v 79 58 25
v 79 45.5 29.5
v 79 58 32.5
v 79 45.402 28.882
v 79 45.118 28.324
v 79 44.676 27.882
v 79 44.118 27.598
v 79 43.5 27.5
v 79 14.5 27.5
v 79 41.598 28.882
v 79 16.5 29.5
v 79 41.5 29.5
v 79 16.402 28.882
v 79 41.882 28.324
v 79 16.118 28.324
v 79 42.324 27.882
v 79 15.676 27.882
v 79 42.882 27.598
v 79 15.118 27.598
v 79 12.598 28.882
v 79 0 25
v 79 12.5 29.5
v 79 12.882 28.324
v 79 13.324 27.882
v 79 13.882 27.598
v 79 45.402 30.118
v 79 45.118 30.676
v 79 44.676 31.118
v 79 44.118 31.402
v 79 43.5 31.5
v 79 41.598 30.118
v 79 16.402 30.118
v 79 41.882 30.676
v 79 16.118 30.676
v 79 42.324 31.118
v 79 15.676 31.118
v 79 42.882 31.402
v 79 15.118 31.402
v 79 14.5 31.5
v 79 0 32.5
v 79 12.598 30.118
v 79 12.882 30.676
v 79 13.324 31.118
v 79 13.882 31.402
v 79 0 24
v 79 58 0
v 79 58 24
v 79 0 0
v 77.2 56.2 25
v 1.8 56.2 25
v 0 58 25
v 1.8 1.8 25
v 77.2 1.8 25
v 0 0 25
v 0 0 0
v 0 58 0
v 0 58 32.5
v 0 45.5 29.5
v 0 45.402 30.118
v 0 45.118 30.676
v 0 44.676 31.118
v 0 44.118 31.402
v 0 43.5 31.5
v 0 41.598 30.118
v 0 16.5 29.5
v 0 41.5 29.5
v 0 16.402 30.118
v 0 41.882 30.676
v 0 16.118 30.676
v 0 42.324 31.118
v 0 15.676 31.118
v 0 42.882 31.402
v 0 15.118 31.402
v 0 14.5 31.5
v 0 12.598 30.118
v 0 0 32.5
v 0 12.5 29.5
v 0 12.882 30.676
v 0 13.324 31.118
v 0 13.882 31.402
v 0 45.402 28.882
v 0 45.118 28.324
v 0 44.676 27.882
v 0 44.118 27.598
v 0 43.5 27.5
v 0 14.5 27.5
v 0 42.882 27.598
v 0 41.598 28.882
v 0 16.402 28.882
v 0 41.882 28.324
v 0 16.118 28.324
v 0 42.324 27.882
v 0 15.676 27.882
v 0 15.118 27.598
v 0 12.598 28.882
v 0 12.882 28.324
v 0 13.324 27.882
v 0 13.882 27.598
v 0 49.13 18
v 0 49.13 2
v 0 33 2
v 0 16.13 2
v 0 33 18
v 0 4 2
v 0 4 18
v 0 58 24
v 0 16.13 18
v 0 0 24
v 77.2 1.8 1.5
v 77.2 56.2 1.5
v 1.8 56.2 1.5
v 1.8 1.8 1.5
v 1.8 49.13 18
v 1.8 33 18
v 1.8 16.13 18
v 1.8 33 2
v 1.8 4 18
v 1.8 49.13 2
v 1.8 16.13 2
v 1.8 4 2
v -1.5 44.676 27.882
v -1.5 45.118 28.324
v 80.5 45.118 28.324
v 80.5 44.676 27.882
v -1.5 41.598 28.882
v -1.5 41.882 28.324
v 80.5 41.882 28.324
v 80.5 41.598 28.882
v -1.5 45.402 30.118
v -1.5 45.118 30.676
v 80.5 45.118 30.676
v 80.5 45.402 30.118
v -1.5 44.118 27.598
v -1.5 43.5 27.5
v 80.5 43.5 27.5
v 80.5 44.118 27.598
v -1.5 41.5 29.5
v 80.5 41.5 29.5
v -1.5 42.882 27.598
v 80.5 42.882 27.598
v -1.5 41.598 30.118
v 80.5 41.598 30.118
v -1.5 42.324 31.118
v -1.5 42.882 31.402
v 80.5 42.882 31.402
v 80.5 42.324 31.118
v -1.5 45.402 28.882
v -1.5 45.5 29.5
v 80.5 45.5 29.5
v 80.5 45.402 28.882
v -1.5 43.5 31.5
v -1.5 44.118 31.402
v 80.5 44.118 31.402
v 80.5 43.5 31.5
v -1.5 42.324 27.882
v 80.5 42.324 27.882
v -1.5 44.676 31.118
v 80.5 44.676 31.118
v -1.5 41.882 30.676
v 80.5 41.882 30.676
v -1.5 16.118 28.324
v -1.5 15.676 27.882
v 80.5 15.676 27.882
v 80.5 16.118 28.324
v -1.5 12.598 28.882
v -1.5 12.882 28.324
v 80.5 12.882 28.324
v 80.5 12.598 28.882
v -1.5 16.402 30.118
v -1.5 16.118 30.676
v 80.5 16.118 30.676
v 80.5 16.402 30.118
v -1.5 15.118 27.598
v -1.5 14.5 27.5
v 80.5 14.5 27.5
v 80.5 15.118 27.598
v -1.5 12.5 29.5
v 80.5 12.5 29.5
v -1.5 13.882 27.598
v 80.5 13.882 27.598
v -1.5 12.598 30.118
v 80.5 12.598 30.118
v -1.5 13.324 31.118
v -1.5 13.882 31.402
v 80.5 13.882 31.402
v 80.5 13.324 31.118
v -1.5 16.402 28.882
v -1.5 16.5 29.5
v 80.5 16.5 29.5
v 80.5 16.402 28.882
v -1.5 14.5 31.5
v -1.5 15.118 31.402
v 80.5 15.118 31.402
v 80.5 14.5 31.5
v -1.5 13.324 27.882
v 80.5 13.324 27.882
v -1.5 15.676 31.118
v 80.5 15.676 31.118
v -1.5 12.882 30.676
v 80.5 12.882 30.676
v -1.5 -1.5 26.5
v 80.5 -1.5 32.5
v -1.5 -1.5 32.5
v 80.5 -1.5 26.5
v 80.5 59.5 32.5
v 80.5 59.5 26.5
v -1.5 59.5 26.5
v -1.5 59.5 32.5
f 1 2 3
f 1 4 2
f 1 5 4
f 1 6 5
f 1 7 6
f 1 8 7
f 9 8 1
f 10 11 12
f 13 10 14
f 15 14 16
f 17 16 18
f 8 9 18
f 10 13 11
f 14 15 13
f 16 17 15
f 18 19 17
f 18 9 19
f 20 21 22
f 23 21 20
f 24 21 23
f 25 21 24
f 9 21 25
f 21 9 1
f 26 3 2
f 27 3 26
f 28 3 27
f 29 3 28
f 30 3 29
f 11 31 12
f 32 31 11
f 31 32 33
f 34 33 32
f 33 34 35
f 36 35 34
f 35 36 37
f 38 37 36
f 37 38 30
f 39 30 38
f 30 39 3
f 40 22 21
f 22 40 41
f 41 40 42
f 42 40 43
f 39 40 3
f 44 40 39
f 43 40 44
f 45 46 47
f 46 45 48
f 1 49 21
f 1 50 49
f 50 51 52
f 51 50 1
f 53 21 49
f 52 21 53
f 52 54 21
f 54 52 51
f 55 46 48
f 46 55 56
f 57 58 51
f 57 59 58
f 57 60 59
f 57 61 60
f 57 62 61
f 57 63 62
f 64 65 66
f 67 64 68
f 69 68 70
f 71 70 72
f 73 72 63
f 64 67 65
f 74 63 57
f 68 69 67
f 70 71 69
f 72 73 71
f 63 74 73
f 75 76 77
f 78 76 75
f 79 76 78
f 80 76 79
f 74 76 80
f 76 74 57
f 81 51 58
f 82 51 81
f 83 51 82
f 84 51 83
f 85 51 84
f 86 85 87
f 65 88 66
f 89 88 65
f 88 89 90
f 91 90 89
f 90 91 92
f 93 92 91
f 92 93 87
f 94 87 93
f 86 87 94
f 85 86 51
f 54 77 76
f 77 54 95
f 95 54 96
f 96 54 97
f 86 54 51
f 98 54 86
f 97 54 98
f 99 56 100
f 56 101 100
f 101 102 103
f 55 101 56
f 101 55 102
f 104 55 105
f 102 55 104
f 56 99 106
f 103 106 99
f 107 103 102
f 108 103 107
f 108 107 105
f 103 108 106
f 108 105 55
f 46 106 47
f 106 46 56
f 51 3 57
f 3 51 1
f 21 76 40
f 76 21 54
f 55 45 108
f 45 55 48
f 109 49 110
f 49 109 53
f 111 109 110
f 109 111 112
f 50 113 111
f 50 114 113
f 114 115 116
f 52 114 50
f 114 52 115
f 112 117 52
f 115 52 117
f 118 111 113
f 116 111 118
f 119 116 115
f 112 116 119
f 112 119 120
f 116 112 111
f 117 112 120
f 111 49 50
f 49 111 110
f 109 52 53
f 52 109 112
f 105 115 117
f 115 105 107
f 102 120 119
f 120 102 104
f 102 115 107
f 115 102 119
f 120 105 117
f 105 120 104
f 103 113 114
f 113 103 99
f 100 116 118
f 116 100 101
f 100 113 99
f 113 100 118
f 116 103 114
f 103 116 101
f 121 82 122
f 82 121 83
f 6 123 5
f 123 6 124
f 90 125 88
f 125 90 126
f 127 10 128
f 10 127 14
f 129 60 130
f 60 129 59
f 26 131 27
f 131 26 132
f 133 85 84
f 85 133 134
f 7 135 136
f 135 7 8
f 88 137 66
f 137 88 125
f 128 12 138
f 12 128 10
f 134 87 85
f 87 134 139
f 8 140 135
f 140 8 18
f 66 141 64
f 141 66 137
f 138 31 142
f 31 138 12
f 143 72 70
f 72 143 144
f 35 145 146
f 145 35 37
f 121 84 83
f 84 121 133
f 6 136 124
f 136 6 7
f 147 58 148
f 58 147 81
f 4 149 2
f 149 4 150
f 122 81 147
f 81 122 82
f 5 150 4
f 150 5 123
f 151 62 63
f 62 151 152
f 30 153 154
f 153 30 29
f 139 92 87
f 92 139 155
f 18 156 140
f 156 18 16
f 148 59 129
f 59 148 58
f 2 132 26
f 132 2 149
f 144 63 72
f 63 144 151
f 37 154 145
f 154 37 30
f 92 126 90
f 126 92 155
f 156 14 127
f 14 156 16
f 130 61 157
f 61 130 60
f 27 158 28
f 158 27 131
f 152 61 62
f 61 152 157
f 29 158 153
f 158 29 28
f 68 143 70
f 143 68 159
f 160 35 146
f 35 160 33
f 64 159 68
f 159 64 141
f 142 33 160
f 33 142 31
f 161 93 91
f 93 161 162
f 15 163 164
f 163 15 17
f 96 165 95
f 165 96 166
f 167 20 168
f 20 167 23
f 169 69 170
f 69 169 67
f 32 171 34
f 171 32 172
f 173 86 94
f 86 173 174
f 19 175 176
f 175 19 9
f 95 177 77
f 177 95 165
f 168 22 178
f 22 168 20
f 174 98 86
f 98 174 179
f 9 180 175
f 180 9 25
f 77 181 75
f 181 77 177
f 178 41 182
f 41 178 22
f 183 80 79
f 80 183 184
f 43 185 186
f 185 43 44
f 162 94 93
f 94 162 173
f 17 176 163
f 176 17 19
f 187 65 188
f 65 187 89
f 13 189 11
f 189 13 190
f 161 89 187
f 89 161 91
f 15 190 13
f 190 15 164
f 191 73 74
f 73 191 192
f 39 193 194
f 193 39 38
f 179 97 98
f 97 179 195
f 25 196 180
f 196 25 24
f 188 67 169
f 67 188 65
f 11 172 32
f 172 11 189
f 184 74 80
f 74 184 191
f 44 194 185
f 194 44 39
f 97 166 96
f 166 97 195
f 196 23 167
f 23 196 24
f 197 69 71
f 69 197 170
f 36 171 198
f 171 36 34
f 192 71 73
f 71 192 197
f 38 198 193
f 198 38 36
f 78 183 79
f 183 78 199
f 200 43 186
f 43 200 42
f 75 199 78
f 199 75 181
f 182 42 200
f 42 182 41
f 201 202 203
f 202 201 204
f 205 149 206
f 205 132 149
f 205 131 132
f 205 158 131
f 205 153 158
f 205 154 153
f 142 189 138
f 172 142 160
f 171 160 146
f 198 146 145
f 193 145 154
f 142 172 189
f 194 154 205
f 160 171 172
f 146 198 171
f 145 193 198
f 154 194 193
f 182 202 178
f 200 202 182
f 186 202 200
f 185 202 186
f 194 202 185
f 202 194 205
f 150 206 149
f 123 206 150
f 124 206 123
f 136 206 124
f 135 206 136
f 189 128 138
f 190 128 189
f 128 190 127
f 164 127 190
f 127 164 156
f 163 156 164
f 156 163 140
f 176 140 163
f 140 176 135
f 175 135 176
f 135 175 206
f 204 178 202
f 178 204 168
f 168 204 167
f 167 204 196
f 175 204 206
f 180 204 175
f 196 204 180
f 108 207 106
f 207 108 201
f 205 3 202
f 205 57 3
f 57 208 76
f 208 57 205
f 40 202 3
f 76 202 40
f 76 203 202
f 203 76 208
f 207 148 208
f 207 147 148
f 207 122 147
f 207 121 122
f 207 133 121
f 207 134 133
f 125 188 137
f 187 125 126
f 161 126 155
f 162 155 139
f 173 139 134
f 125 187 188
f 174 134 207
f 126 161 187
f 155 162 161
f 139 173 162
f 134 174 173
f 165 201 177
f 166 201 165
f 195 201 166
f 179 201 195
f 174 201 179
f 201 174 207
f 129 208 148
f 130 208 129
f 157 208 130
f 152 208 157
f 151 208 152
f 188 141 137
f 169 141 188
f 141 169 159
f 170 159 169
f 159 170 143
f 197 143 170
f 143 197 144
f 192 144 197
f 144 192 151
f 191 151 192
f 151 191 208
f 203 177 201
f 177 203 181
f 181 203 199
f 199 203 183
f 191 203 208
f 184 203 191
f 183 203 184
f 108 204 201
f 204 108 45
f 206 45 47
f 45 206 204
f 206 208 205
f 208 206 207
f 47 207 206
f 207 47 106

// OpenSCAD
module mimic_board() {
    cube([74.04, 53, 5]);
    translate([-1, 3, 2]) {
        cube([14.5, 9.13, 12]);
    }
    translate([14.5, 1, 5]) {
        cube([58, 2, 26]);
    }
    translate([14.5, 50, 5]) {
        cube([58, 2, 26]);
    }
    translate([-6.34, 32.4, 2]) {
        cube([16.4, 12.3, 12]);
    }
    
    translate([14.5, 5, 5]) {
        cube([58, 43, 10]);
    }
}

module potentiometer() {
    cylinder(6, 9, 9, $fn=20);
    cylinder(8, 5, 5, $fn=20);
    difference() {
        cylinder(35, 2.5, 2.5, $fn=20);
        translate([1,-3,20]) {
            cube([5, 6, 16]);
        }
    }
}

module potentiometer_holder() {
    difference() {
        translate([-10, -17, 0]) {
            cube([20, 30, 6]);
        }
        translate([0,0,0]) {
            cylinder(9, 9.5, 9.5, $fn=30);
        }
        translate([-9,-20,-1]) {
             cube([18, 15, 8]);
        }
    }
}

// potentiometer();

module mounting_holes(w,d,h,t,tt) {
    translate([-t*2,3*d/4,h+tt/2-t]) {
        rotate([0,90,0]) {
                cylinder(w+t*8, 2, 2, $fn=20);
        }
    }
    translate([-t*2,d/4,h+tt/2-t]) {
        rotate([0,90,0]) {
                cylinder(w+t*8, 2, 2, $fn=20);
        }
    }
}
module frame_join(w,d,h,t=1.5,tt=4) {
    difference() {
    hull() {
        cube([w,d,1]);
        translate([-t,-t,h-t]) {
            cube([w+t*2,d+t*2, tt]); 
        }
    }
    translate([0,0,-1]) {
        cube([w,d,h+2+tt]);
    }
    mounting_holes(w,d,h,t,tt);
    }
    
    
}

module board_base() {
    difference() {
        cube([79, 58, 25]);
        translate([1.8, 1.8, 1.5]) {
            cube([79-3.6, 58-3.6, 25.5]);
        }
        translate([-2, 4, 2]) {
            cube([14.5, 12.13, 16]);
        }
        translate([-2, 33, 2]) {
            cube([14.5, 16.13, 16]);
        }
    }
    
    translate([0,0,24]) {
        difference() {
        frame_join(79, 58, 4, 1.5, 6);
        }
    }
}

module board_input_holder() {
    translate([15,8+42/2,0]) {
        //potentiometer();
        potentiometer_holder();
    };
    translate([45,8+42/2,0]) {
        //potentiometer();
        potentiometer_holder();
    };
    difference() {
    translate([1,8,0]) {
        cube([77, 42, 2]);
        cube([1.5, 42, 8.5]);
        translate([75.5, 0, 0]) {
            cube([1.5, 42, 8.5]);
        }
    }
    mounting_holes(79, 58, 4, 1.5, 5);
    }
}

module board_top() {
    h = 13;
    translate([-2, -2, 0]) {
        difference() {
            cube([86, 65, h]);
            translate([1.5,1.5, -0.5]) {
                cube([86-3, 65-3, h-2]);
            }
            translate([18.5, 32.5, -1]) {
                cylinder(h*2, 3, 3, $fn=20);
            }
            translate([48.5, 32.5, -1]) {
                cylinder(h*2, 3, 3, $fn=20);
            }
            translate([0, 3.5, -0]) {
                mounting_holes(79, 58, 2, 1.5, 5);
            }
        };
        
     }
}

board_base();

translate([0, 0,25]) {
    //board_input_holder();
}

translate([-1.5, -1.5, 36.5]) {
        //board_top();
}

translate([2.5,2.5,2]) {
    //mimic_board(); // For debugging reasons
}
